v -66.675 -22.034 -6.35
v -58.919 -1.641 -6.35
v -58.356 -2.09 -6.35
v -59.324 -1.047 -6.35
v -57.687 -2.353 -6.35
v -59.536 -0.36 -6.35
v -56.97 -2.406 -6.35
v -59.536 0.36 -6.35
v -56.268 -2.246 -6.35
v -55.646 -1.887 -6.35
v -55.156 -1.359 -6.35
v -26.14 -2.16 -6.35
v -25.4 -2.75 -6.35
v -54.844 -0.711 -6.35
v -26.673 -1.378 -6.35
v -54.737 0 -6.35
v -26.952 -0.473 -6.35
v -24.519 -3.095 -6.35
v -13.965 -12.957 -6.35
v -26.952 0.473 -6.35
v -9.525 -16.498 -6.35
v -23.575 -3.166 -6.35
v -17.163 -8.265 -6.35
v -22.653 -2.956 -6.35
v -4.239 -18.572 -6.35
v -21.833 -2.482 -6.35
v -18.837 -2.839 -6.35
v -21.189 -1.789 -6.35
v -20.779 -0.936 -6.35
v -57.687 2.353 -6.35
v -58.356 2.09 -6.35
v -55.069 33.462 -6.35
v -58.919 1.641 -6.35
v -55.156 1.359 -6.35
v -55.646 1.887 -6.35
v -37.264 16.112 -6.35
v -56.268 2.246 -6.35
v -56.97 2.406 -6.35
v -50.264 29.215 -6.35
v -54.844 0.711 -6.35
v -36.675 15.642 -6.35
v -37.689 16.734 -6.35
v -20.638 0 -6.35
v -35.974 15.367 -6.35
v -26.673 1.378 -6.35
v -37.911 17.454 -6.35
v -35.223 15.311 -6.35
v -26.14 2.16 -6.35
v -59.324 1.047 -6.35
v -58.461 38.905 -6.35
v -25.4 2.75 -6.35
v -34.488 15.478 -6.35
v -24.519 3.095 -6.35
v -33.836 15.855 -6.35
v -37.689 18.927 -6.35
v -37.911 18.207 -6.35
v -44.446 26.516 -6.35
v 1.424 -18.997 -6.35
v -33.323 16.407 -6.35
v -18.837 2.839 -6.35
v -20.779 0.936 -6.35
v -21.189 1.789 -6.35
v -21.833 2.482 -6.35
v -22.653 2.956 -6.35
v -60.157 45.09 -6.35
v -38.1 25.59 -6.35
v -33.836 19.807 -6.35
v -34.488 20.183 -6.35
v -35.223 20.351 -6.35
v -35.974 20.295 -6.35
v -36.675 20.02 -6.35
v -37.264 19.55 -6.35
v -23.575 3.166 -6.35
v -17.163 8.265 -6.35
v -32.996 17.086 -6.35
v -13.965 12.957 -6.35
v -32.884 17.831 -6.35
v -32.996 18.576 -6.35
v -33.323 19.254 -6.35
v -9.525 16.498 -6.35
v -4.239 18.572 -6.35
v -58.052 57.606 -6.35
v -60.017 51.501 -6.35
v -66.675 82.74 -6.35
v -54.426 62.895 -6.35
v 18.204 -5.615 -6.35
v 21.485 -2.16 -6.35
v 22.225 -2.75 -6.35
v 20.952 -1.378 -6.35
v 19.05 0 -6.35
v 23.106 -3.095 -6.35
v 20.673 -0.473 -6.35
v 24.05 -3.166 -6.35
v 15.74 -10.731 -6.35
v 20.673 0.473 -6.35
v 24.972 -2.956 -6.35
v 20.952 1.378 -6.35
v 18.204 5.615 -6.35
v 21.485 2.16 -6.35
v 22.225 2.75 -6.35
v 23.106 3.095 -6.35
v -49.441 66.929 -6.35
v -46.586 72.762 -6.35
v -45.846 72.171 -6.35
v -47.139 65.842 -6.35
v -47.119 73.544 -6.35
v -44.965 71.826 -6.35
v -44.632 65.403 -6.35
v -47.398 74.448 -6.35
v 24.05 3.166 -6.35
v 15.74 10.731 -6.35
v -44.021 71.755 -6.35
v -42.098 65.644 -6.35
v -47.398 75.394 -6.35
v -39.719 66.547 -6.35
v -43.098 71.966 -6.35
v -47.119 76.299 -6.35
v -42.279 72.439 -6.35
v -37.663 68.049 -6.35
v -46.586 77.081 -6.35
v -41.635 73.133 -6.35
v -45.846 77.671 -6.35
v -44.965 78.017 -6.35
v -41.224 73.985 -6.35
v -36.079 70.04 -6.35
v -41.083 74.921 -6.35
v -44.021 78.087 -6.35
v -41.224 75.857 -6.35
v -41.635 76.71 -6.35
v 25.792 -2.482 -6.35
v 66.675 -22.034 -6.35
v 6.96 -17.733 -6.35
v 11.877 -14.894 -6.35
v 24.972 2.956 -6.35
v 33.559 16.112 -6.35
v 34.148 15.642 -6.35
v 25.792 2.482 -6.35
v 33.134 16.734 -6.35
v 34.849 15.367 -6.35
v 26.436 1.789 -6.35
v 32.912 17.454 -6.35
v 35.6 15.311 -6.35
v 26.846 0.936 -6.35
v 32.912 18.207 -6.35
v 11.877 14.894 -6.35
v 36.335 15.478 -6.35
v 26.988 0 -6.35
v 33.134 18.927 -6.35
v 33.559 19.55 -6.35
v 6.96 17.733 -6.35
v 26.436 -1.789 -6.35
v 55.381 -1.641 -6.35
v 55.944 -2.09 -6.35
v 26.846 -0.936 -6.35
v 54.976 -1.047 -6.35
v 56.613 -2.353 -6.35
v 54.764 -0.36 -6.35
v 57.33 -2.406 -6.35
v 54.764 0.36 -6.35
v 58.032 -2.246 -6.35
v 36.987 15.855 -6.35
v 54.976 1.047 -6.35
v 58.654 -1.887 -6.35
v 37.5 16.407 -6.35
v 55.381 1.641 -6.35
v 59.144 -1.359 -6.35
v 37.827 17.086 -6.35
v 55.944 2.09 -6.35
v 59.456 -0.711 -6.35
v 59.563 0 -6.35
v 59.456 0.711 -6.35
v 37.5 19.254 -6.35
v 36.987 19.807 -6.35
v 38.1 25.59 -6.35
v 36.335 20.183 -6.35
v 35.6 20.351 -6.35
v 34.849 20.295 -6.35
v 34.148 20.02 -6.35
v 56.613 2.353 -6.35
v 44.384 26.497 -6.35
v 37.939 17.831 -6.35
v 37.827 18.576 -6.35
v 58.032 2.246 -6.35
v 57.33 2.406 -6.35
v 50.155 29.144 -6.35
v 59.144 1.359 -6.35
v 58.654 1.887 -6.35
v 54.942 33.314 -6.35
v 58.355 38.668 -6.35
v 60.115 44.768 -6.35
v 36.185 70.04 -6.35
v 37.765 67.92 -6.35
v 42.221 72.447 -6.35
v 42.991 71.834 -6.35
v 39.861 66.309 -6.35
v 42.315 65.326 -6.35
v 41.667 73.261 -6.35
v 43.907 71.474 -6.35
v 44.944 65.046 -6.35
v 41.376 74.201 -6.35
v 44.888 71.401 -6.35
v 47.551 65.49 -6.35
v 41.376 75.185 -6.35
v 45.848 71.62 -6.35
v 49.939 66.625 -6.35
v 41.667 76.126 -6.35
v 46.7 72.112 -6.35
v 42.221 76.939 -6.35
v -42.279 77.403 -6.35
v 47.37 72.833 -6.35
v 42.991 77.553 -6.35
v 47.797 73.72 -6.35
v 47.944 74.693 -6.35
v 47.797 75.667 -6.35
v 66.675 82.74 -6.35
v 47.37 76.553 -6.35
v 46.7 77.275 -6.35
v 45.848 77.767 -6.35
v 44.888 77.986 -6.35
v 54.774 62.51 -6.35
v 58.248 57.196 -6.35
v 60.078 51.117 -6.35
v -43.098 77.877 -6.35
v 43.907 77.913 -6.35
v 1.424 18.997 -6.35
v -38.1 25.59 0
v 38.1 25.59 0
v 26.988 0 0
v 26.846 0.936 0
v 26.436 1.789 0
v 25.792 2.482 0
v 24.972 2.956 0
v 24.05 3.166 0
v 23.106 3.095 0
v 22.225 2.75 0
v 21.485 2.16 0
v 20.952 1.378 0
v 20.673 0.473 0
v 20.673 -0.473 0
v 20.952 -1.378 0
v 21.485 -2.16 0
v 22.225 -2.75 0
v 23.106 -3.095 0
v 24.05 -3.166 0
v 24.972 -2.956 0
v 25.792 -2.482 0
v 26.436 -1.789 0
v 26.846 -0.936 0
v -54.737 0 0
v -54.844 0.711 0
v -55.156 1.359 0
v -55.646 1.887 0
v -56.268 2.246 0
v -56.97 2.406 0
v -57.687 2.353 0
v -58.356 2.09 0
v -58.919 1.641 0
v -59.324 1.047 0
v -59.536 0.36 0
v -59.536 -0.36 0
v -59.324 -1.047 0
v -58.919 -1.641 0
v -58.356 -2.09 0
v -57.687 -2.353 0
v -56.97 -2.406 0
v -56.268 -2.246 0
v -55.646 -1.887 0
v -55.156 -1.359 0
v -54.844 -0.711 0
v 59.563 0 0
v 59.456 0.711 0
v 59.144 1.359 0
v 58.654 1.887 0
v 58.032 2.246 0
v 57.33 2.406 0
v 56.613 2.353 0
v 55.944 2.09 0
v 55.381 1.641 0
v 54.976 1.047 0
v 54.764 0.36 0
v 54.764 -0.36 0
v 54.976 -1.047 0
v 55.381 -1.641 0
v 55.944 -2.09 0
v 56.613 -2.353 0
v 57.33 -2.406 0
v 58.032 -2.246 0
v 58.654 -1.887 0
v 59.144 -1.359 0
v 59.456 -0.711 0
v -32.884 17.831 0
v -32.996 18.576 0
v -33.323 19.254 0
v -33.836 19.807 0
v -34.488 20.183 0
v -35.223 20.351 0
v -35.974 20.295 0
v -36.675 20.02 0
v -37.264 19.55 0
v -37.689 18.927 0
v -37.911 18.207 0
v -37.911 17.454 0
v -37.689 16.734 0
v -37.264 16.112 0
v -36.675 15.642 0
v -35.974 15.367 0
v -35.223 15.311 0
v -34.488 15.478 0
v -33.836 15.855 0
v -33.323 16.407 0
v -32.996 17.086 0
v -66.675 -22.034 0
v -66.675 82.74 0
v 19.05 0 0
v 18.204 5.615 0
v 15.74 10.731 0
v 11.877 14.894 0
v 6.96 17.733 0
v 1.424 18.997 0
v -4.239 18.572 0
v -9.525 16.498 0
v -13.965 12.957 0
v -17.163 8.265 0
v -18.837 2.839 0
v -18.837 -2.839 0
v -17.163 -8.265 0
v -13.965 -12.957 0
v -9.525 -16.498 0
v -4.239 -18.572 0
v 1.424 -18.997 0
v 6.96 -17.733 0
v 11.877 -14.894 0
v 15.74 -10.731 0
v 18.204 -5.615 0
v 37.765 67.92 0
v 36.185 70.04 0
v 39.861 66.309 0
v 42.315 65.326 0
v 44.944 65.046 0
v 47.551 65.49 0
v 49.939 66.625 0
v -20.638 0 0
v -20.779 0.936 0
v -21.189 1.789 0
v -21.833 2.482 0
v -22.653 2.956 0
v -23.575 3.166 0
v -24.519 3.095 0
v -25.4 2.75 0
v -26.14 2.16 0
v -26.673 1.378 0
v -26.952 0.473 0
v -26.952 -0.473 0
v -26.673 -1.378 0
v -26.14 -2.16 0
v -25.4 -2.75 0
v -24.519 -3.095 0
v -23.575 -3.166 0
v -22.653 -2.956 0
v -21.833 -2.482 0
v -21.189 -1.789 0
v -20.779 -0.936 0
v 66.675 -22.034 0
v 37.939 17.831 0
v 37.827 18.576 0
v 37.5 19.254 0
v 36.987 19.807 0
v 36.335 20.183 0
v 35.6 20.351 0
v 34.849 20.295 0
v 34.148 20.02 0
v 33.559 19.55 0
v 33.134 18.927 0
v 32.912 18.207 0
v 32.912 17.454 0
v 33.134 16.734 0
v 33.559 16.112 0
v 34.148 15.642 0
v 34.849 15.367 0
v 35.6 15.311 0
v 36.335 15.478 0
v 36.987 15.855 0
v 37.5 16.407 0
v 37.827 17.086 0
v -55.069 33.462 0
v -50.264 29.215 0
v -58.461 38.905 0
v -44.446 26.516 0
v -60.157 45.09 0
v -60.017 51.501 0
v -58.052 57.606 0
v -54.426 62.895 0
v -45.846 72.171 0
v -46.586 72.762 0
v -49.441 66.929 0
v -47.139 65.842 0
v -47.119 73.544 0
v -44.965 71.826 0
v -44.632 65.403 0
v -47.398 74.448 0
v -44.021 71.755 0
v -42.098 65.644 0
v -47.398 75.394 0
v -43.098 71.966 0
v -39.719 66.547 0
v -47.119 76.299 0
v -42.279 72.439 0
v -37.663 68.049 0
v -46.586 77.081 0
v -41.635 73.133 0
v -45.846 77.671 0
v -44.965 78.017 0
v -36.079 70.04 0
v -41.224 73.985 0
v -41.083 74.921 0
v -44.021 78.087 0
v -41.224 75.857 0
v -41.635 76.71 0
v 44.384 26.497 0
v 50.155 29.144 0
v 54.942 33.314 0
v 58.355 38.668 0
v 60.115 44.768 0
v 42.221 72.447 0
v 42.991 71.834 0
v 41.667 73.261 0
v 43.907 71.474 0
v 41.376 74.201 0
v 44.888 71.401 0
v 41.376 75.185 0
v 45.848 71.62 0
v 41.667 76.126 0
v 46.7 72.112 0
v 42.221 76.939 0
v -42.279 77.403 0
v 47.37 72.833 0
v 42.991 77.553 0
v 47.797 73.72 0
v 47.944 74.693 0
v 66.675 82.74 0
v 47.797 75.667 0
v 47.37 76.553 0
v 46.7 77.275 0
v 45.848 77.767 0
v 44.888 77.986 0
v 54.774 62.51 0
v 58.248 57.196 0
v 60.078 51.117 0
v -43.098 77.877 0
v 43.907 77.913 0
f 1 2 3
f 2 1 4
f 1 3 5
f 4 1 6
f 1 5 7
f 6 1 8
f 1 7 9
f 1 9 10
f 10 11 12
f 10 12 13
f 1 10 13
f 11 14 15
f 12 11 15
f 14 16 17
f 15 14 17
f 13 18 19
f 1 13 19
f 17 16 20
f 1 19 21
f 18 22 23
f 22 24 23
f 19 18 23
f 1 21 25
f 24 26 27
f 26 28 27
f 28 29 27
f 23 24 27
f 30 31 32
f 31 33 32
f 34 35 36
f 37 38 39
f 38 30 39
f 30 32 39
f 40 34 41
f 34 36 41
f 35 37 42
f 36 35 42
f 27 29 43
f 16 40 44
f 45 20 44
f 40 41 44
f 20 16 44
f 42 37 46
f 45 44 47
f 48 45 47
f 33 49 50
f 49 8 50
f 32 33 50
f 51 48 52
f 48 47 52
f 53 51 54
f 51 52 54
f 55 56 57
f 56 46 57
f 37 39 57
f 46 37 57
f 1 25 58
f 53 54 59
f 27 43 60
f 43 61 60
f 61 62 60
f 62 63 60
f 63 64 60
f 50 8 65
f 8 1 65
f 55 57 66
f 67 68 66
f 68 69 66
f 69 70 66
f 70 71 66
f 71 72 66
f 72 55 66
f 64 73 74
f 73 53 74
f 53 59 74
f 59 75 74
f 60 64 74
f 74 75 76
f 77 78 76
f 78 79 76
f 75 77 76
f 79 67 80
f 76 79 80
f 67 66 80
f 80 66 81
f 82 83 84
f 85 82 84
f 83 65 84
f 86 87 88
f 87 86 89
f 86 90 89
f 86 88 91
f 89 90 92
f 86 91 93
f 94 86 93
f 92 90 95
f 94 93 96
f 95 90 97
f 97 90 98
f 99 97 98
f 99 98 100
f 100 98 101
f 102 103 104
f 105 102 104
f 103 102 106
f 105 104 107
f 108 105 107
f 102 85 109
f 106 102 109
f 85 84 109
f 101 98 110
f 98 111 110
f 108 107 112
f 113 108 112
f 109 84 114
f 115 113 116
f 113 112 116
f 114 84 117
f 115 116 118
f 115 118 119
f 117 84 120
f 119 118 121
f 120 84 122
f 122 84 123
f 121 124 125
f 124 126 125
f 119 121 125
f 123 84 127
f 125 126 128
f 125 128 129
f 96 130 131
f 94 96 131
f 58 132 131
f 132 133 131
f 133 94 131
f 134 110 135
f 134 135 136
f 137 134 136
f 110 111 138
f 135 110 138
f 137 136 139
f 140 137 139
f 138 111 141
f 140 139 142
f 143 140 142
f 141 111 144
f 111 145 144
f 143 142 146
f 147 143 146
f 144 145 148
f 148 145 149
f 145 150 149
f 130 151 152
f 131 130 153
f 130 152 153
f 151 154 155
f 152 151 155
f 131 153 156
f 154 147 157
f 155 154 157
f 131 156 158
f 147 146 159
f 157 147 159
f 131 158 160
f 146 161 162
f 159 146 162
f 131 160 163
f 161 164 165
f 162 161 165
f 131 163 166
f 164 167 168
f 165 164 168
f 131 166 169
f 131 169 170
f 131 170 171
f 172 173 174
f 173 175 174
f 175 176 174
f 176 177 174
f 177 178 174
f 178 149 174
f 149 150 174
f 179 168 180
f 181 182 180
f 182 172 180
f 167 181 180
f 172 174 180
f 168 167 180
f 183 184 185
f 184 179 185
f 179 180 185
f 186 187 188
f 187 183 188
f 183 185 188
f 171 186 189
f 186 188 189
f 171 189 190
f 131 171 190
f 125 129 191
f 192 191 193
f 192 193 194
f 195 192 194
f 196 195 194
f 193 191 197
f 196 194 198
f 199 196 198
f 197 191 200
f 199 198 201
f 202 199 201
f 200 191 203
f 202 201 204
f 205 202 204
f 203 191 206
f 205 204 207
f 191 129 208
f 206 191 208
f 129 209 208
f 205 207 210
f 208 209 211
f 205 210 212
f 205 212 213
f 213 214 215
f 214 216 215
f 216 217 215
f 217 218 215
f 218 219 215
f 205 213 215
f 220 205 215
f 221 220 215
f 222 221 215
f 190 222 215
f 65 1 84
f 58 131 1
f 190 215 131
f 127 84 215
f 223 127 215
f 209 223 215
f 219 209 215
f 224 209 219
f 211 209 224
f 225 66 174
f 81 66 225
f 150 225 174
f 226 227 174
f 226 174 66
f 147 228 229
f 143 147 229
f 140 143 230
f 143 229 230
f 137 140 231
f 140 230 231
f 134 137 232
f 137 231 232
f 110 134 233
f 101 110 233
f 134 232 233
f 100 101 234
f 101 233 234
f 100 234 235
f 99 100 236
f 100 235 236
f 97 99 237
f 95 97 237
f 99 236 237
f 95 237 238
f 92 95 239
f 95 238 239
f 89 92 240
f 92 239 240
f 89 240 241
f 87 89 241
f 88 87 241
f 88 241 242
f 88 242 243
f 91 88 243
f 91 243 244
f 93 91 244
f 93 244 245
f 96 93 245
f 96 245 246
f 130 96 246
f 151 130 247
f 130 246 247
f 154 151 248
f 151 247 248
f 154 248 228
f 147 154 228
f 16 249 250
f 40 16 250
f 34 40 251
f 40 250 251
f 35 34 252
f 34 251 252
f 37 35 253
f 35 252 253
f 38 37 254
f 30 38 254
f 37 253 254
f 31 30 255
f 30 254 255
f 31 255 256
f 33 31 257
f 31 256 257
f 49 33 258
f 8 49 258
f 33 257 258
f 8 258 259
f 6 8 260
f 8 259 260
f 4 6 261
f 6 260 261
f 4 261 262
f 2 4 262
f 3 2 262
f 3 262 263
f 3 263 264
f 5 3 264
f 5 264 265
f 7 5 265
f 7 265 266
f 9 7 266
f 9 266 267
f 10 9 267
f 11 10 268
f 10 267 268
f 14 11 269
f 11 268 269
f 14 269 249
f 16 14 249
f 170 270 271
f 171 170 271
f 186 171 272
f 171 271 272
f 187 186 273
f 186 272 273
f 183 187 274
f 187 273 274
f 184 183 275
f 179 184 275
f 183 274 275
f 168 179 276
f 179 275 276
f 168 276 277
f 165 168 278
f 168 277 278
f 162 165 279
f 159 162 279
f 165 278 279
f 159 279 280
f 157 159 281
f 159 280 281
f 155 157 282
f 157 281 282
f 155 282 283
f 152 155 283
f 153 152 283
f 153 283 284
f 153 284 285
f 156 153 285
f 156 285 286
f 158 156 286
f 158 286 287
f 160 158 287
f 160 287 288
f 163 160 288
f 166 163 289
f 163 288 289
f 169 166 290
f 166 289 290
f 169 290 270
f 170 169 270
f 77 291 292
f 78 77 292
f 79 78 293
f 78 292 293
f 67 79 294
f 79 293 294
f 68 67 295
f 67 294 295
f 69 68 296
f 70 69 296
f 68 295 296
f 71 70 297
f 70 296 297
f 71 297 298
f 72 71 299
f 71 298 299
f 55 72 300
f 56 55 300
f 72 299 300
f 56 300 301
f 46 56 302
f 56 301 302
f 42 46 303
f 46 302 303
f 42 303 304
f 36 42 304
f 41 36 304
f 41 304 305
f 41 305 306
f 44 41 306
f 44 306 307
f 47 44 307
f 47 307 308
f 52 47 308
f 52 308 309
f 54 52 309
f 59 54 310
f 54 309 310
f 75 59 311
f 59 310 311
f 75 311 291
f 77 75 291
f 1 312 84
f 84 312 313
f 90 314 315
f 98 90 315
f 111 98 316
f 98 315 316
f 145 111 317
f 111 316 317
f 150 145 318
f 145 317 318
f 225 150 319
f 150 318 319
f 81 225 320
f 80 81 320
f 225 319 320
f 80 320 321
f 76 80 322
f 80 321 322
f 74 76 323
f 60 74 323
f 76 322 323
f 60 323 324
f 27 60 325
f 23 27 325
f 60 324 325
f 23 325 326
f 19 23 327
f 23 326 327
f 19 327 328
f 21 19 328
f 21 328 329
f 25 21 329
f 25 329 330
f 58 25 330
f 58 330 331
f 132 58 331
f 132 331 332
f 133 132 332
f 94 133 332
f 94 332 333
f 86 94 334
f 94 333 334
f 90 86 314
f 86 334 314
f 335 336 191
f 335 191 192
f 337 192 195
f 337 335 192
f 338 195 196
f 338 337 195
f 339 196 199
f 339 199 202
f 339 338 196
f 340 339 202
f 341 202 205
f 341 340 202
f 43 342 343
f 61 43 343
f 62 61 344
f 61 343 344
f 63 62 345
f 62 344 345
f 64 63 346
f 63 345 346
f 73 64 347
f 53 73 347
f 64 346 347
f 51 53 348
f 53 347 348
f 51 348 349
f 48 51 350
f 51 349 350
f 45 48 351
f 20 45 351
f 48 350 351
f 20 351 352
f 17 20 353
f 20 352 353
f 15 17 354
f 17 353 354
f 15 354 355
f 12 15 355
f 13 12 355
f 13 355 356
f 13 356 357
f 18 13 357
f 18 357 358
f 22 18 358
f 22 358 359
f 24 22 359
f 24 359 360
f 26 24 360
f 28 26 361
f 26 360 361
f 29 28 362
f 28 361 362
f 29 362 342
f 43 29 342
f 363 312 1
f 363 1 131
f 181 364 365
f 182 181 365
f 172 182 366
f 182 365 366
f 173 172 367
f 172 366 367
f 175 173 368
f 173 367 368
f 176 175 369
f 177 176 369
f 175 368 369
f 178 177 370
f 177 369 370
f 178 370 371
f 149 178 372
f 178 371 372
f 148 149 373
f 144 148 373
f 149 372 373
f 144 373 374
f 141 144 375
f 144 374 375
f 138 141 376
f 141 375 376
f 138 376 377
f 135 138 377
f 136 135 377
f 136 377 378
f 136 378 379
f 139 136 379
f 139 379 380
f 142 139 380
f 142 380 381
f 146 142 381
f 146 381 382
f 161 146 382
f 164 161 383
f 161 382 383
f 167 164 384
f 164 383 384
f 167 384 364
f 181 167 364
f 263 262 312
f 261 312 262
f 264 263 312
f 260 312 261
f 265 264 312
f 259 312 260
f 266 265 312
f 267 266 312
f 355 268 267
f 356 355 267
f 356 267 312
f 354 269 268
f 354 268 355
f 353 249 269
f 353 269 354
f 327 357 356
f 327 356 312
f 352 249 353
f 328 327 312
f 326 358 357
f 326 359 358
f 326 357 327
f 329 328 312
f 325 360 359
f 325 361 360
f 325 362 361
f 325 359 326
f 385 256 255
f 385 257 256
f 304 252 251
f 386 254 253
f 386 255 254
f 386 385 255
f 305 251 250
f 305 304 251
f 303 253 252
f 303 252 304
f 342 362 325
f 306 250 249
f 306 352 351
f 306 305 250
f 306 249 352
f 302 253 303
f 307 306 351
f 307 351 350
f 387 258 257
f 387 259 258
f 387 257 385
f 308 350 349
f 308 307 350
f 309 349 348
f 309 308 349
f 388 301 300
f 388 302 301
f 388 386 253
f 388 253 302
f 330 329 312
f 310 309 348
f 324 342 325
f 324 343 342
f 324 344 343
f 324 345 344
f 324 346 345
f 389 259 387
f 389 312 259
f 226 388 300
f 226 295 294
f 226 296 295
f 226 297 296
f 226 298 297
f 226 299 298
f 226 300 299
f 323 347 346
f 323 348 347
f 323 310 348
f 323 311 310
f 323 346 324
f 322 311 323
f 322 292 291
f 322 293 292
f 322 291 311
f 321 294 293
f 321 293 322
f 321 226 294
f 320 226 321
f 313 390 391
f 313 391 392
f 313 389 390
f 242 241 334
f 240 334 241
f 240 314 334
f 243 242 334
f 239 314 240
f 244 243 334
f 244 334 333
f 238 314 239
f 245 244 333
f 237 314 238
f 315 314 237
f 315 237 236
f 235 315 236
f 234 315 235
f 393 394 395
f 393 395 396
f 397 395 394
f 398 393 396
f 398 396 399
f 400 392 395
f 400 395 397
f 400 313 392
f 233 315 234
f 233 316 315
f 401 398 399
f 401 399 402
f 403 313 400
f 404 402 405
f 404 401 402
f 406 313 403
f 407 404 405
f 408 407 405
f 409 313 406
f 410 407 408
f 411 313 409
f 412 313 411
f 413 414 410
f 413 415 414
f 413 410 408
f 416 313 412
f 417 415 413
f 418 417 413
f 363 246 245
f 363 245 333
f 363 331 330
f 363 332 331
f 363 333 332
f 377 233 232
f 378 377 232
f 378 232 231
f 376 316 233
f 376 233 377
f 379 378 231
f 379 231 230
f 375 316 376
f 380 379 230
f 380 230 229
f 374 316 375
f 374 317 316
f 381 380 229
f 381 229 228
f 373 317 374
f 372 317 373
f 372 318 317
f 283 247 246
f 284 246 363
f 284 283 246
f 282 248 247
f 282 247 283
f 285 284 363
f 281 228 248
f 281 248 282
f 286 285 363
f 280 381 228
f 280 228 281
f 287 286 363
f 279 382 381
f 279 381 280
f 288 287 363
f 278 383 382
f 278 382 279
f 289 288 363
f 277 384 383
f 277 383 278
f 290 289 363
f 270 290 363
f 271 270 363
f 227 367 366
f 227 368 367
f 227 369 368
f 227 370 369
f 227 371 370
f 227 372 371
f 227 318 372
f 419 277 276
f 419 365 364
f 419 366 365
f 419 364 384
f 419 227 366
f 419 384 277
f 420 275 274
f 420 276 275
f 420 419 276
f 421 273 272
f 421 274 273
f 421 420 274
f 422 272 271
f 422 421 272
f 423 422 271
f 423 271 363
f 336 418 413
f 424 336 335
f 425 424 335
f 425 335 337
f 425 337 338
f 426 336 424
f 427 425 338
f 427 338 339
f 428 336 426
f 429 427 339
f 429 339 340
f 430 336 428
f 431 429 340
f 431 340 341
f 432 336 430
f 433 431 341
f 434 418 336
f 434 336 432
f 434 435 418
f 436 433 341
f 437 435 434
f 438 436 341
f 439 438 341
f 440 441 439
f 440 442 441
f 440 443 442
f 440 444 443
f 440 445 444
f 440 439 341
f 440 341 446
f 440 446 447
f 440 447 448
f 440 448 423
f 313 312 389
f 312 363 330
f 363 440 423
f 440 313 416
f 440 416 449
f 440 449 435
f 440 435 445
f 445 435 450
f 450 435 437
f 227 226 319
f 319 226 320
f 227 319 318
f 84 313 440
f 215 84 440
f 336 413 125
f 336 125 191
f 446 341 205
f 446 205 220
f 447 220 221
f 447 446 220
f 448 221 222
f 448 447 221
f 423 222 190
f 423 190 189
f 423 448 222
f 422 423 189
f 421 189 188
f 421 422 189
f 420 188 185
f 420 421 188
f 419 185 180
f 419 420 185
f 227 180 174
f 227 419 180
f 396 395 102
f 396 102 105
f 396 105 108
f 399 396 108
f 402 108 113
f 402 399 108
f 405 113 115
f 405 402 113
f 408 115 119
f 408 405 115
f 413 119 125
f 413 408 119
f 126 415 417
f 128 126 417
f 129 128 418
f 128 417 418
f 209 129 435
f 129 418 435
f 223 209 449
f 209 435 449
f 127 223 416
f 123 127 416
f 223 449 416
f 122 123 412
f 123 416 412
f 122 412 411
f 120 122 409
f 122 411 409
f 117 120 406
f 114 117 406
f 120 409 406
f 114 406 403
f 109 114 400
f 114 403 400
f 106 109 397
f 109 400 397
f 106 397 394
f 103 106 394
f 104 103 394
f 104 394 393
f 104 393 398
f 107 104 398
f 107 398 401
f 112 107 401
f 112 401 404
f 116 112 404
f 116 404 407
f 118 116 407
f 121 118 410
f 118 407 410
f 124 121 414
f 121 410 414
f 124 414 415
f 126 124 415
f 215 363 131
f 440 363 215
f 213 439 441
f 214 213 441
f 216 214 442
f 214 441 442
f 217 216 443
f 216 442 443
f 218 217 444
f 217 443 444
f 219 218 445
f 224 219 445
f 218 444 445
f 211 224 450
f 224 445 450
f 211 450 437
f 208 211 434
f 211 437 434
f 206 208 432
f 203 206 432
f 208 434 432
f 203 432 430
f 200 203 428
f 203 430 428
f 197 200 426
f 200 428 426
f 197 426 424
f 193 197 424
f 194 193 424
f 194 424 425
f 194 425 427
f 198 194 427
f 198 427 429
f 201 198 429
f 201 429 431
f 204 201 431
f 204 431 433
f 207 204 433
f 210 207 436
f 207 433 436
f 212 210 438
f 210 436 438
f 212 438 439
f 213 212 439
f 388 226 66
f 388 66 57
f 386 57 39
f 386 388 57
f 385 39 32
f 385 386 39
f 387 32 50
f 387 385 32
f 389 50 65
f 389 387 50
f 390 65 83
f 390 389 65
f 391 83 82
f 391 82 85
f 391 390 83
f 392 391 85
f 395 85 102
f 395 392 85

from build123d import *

# Parameters (mm, degrees)
SKETCH1_W           = 133.35
SKETCH1_H           = 104.775
SKETCH1_R           = 2.413
SKETCH1_R_2         = 2.5273
SKETCH1_R_3         = 3.175
SKETCH1_R_4         = 19.05
SKETCH1_R_5         = 3.302
BOSS_EXTRUDE1_DEPTH = 6.35


with BuildPart() as part:
    # Sketch1 → Boss-Extrude1 (new body)
    with BuildSketch(Plane.XY):
        with Locations((0, 30.353)):
            Rectangle(SKETCH1_W, SKETCH1_H)
        with Locations((-57.15, 0)):
            Circle(SKETCH1_R, mode=Mode.SUBTRACT)
        with Locations((-35.41150672, 17.8308)):
            Circle(SKETCH1_R_2, mode=Mode.SUBTRACT)
        with Locations((-23.8125, 0)):
            Circle(SKETCH1_R_3, mode=Mode.SUBTRACT)
        Circle(SKETCH1_R_4, mode=Mode.SUBTRACT)
        with Locations((23.8125, 0)):
            Circle(SKETCH1_R_3, mode=Mode.SUBTRACT)
        with Locations((35.41150672, 17.8308)):
            Circle(SKETCH1_R_2, mode=Mode.SUBTRACT)
        with Locations((57.15, 0)):
            Circle(SKETCH1_R, mode=Mode.SUBTRACT)
        with Locations((44.64152658, 74.693330266)):
            Circle(SKETCH1_R_5, mode=Mode.SUBTRACT)
        with Locations((-44.258181609, 74.921110792)):
            Circle(SKETCH1_R_3, mode=Mode.SUBTRACT)
        with BuildLine():
            Line((-36.078617849, 70.0405), (36.185033541, 70.0405))
            ThreePointArc((36.185033541, 70.0405), (42.31521137, 65.325867347), (49.938818951, 66.624885711))
            ThreePointArc((49.938818951, 66.624885711), (59.454030327, 41.654654783), (38.1, 25.5905))
            Line((38.1, 25.5905), (-38.1, 25.5905))
            ThreePointArc((-38.1, 25.5905), (-59.533112769, 41.9356784), (-49.440641566, 66.929381706))
            ThreePointArc((-49.440641566, 66.929381706), (-42.098222799, 65.644246939), (-36.078617849, 70.0405))
        make_face(mode=Mode.SUBTRACT)
    extrude(amount=-BOSS_EXTRUDE1_DEPTH)


solid = part.part
